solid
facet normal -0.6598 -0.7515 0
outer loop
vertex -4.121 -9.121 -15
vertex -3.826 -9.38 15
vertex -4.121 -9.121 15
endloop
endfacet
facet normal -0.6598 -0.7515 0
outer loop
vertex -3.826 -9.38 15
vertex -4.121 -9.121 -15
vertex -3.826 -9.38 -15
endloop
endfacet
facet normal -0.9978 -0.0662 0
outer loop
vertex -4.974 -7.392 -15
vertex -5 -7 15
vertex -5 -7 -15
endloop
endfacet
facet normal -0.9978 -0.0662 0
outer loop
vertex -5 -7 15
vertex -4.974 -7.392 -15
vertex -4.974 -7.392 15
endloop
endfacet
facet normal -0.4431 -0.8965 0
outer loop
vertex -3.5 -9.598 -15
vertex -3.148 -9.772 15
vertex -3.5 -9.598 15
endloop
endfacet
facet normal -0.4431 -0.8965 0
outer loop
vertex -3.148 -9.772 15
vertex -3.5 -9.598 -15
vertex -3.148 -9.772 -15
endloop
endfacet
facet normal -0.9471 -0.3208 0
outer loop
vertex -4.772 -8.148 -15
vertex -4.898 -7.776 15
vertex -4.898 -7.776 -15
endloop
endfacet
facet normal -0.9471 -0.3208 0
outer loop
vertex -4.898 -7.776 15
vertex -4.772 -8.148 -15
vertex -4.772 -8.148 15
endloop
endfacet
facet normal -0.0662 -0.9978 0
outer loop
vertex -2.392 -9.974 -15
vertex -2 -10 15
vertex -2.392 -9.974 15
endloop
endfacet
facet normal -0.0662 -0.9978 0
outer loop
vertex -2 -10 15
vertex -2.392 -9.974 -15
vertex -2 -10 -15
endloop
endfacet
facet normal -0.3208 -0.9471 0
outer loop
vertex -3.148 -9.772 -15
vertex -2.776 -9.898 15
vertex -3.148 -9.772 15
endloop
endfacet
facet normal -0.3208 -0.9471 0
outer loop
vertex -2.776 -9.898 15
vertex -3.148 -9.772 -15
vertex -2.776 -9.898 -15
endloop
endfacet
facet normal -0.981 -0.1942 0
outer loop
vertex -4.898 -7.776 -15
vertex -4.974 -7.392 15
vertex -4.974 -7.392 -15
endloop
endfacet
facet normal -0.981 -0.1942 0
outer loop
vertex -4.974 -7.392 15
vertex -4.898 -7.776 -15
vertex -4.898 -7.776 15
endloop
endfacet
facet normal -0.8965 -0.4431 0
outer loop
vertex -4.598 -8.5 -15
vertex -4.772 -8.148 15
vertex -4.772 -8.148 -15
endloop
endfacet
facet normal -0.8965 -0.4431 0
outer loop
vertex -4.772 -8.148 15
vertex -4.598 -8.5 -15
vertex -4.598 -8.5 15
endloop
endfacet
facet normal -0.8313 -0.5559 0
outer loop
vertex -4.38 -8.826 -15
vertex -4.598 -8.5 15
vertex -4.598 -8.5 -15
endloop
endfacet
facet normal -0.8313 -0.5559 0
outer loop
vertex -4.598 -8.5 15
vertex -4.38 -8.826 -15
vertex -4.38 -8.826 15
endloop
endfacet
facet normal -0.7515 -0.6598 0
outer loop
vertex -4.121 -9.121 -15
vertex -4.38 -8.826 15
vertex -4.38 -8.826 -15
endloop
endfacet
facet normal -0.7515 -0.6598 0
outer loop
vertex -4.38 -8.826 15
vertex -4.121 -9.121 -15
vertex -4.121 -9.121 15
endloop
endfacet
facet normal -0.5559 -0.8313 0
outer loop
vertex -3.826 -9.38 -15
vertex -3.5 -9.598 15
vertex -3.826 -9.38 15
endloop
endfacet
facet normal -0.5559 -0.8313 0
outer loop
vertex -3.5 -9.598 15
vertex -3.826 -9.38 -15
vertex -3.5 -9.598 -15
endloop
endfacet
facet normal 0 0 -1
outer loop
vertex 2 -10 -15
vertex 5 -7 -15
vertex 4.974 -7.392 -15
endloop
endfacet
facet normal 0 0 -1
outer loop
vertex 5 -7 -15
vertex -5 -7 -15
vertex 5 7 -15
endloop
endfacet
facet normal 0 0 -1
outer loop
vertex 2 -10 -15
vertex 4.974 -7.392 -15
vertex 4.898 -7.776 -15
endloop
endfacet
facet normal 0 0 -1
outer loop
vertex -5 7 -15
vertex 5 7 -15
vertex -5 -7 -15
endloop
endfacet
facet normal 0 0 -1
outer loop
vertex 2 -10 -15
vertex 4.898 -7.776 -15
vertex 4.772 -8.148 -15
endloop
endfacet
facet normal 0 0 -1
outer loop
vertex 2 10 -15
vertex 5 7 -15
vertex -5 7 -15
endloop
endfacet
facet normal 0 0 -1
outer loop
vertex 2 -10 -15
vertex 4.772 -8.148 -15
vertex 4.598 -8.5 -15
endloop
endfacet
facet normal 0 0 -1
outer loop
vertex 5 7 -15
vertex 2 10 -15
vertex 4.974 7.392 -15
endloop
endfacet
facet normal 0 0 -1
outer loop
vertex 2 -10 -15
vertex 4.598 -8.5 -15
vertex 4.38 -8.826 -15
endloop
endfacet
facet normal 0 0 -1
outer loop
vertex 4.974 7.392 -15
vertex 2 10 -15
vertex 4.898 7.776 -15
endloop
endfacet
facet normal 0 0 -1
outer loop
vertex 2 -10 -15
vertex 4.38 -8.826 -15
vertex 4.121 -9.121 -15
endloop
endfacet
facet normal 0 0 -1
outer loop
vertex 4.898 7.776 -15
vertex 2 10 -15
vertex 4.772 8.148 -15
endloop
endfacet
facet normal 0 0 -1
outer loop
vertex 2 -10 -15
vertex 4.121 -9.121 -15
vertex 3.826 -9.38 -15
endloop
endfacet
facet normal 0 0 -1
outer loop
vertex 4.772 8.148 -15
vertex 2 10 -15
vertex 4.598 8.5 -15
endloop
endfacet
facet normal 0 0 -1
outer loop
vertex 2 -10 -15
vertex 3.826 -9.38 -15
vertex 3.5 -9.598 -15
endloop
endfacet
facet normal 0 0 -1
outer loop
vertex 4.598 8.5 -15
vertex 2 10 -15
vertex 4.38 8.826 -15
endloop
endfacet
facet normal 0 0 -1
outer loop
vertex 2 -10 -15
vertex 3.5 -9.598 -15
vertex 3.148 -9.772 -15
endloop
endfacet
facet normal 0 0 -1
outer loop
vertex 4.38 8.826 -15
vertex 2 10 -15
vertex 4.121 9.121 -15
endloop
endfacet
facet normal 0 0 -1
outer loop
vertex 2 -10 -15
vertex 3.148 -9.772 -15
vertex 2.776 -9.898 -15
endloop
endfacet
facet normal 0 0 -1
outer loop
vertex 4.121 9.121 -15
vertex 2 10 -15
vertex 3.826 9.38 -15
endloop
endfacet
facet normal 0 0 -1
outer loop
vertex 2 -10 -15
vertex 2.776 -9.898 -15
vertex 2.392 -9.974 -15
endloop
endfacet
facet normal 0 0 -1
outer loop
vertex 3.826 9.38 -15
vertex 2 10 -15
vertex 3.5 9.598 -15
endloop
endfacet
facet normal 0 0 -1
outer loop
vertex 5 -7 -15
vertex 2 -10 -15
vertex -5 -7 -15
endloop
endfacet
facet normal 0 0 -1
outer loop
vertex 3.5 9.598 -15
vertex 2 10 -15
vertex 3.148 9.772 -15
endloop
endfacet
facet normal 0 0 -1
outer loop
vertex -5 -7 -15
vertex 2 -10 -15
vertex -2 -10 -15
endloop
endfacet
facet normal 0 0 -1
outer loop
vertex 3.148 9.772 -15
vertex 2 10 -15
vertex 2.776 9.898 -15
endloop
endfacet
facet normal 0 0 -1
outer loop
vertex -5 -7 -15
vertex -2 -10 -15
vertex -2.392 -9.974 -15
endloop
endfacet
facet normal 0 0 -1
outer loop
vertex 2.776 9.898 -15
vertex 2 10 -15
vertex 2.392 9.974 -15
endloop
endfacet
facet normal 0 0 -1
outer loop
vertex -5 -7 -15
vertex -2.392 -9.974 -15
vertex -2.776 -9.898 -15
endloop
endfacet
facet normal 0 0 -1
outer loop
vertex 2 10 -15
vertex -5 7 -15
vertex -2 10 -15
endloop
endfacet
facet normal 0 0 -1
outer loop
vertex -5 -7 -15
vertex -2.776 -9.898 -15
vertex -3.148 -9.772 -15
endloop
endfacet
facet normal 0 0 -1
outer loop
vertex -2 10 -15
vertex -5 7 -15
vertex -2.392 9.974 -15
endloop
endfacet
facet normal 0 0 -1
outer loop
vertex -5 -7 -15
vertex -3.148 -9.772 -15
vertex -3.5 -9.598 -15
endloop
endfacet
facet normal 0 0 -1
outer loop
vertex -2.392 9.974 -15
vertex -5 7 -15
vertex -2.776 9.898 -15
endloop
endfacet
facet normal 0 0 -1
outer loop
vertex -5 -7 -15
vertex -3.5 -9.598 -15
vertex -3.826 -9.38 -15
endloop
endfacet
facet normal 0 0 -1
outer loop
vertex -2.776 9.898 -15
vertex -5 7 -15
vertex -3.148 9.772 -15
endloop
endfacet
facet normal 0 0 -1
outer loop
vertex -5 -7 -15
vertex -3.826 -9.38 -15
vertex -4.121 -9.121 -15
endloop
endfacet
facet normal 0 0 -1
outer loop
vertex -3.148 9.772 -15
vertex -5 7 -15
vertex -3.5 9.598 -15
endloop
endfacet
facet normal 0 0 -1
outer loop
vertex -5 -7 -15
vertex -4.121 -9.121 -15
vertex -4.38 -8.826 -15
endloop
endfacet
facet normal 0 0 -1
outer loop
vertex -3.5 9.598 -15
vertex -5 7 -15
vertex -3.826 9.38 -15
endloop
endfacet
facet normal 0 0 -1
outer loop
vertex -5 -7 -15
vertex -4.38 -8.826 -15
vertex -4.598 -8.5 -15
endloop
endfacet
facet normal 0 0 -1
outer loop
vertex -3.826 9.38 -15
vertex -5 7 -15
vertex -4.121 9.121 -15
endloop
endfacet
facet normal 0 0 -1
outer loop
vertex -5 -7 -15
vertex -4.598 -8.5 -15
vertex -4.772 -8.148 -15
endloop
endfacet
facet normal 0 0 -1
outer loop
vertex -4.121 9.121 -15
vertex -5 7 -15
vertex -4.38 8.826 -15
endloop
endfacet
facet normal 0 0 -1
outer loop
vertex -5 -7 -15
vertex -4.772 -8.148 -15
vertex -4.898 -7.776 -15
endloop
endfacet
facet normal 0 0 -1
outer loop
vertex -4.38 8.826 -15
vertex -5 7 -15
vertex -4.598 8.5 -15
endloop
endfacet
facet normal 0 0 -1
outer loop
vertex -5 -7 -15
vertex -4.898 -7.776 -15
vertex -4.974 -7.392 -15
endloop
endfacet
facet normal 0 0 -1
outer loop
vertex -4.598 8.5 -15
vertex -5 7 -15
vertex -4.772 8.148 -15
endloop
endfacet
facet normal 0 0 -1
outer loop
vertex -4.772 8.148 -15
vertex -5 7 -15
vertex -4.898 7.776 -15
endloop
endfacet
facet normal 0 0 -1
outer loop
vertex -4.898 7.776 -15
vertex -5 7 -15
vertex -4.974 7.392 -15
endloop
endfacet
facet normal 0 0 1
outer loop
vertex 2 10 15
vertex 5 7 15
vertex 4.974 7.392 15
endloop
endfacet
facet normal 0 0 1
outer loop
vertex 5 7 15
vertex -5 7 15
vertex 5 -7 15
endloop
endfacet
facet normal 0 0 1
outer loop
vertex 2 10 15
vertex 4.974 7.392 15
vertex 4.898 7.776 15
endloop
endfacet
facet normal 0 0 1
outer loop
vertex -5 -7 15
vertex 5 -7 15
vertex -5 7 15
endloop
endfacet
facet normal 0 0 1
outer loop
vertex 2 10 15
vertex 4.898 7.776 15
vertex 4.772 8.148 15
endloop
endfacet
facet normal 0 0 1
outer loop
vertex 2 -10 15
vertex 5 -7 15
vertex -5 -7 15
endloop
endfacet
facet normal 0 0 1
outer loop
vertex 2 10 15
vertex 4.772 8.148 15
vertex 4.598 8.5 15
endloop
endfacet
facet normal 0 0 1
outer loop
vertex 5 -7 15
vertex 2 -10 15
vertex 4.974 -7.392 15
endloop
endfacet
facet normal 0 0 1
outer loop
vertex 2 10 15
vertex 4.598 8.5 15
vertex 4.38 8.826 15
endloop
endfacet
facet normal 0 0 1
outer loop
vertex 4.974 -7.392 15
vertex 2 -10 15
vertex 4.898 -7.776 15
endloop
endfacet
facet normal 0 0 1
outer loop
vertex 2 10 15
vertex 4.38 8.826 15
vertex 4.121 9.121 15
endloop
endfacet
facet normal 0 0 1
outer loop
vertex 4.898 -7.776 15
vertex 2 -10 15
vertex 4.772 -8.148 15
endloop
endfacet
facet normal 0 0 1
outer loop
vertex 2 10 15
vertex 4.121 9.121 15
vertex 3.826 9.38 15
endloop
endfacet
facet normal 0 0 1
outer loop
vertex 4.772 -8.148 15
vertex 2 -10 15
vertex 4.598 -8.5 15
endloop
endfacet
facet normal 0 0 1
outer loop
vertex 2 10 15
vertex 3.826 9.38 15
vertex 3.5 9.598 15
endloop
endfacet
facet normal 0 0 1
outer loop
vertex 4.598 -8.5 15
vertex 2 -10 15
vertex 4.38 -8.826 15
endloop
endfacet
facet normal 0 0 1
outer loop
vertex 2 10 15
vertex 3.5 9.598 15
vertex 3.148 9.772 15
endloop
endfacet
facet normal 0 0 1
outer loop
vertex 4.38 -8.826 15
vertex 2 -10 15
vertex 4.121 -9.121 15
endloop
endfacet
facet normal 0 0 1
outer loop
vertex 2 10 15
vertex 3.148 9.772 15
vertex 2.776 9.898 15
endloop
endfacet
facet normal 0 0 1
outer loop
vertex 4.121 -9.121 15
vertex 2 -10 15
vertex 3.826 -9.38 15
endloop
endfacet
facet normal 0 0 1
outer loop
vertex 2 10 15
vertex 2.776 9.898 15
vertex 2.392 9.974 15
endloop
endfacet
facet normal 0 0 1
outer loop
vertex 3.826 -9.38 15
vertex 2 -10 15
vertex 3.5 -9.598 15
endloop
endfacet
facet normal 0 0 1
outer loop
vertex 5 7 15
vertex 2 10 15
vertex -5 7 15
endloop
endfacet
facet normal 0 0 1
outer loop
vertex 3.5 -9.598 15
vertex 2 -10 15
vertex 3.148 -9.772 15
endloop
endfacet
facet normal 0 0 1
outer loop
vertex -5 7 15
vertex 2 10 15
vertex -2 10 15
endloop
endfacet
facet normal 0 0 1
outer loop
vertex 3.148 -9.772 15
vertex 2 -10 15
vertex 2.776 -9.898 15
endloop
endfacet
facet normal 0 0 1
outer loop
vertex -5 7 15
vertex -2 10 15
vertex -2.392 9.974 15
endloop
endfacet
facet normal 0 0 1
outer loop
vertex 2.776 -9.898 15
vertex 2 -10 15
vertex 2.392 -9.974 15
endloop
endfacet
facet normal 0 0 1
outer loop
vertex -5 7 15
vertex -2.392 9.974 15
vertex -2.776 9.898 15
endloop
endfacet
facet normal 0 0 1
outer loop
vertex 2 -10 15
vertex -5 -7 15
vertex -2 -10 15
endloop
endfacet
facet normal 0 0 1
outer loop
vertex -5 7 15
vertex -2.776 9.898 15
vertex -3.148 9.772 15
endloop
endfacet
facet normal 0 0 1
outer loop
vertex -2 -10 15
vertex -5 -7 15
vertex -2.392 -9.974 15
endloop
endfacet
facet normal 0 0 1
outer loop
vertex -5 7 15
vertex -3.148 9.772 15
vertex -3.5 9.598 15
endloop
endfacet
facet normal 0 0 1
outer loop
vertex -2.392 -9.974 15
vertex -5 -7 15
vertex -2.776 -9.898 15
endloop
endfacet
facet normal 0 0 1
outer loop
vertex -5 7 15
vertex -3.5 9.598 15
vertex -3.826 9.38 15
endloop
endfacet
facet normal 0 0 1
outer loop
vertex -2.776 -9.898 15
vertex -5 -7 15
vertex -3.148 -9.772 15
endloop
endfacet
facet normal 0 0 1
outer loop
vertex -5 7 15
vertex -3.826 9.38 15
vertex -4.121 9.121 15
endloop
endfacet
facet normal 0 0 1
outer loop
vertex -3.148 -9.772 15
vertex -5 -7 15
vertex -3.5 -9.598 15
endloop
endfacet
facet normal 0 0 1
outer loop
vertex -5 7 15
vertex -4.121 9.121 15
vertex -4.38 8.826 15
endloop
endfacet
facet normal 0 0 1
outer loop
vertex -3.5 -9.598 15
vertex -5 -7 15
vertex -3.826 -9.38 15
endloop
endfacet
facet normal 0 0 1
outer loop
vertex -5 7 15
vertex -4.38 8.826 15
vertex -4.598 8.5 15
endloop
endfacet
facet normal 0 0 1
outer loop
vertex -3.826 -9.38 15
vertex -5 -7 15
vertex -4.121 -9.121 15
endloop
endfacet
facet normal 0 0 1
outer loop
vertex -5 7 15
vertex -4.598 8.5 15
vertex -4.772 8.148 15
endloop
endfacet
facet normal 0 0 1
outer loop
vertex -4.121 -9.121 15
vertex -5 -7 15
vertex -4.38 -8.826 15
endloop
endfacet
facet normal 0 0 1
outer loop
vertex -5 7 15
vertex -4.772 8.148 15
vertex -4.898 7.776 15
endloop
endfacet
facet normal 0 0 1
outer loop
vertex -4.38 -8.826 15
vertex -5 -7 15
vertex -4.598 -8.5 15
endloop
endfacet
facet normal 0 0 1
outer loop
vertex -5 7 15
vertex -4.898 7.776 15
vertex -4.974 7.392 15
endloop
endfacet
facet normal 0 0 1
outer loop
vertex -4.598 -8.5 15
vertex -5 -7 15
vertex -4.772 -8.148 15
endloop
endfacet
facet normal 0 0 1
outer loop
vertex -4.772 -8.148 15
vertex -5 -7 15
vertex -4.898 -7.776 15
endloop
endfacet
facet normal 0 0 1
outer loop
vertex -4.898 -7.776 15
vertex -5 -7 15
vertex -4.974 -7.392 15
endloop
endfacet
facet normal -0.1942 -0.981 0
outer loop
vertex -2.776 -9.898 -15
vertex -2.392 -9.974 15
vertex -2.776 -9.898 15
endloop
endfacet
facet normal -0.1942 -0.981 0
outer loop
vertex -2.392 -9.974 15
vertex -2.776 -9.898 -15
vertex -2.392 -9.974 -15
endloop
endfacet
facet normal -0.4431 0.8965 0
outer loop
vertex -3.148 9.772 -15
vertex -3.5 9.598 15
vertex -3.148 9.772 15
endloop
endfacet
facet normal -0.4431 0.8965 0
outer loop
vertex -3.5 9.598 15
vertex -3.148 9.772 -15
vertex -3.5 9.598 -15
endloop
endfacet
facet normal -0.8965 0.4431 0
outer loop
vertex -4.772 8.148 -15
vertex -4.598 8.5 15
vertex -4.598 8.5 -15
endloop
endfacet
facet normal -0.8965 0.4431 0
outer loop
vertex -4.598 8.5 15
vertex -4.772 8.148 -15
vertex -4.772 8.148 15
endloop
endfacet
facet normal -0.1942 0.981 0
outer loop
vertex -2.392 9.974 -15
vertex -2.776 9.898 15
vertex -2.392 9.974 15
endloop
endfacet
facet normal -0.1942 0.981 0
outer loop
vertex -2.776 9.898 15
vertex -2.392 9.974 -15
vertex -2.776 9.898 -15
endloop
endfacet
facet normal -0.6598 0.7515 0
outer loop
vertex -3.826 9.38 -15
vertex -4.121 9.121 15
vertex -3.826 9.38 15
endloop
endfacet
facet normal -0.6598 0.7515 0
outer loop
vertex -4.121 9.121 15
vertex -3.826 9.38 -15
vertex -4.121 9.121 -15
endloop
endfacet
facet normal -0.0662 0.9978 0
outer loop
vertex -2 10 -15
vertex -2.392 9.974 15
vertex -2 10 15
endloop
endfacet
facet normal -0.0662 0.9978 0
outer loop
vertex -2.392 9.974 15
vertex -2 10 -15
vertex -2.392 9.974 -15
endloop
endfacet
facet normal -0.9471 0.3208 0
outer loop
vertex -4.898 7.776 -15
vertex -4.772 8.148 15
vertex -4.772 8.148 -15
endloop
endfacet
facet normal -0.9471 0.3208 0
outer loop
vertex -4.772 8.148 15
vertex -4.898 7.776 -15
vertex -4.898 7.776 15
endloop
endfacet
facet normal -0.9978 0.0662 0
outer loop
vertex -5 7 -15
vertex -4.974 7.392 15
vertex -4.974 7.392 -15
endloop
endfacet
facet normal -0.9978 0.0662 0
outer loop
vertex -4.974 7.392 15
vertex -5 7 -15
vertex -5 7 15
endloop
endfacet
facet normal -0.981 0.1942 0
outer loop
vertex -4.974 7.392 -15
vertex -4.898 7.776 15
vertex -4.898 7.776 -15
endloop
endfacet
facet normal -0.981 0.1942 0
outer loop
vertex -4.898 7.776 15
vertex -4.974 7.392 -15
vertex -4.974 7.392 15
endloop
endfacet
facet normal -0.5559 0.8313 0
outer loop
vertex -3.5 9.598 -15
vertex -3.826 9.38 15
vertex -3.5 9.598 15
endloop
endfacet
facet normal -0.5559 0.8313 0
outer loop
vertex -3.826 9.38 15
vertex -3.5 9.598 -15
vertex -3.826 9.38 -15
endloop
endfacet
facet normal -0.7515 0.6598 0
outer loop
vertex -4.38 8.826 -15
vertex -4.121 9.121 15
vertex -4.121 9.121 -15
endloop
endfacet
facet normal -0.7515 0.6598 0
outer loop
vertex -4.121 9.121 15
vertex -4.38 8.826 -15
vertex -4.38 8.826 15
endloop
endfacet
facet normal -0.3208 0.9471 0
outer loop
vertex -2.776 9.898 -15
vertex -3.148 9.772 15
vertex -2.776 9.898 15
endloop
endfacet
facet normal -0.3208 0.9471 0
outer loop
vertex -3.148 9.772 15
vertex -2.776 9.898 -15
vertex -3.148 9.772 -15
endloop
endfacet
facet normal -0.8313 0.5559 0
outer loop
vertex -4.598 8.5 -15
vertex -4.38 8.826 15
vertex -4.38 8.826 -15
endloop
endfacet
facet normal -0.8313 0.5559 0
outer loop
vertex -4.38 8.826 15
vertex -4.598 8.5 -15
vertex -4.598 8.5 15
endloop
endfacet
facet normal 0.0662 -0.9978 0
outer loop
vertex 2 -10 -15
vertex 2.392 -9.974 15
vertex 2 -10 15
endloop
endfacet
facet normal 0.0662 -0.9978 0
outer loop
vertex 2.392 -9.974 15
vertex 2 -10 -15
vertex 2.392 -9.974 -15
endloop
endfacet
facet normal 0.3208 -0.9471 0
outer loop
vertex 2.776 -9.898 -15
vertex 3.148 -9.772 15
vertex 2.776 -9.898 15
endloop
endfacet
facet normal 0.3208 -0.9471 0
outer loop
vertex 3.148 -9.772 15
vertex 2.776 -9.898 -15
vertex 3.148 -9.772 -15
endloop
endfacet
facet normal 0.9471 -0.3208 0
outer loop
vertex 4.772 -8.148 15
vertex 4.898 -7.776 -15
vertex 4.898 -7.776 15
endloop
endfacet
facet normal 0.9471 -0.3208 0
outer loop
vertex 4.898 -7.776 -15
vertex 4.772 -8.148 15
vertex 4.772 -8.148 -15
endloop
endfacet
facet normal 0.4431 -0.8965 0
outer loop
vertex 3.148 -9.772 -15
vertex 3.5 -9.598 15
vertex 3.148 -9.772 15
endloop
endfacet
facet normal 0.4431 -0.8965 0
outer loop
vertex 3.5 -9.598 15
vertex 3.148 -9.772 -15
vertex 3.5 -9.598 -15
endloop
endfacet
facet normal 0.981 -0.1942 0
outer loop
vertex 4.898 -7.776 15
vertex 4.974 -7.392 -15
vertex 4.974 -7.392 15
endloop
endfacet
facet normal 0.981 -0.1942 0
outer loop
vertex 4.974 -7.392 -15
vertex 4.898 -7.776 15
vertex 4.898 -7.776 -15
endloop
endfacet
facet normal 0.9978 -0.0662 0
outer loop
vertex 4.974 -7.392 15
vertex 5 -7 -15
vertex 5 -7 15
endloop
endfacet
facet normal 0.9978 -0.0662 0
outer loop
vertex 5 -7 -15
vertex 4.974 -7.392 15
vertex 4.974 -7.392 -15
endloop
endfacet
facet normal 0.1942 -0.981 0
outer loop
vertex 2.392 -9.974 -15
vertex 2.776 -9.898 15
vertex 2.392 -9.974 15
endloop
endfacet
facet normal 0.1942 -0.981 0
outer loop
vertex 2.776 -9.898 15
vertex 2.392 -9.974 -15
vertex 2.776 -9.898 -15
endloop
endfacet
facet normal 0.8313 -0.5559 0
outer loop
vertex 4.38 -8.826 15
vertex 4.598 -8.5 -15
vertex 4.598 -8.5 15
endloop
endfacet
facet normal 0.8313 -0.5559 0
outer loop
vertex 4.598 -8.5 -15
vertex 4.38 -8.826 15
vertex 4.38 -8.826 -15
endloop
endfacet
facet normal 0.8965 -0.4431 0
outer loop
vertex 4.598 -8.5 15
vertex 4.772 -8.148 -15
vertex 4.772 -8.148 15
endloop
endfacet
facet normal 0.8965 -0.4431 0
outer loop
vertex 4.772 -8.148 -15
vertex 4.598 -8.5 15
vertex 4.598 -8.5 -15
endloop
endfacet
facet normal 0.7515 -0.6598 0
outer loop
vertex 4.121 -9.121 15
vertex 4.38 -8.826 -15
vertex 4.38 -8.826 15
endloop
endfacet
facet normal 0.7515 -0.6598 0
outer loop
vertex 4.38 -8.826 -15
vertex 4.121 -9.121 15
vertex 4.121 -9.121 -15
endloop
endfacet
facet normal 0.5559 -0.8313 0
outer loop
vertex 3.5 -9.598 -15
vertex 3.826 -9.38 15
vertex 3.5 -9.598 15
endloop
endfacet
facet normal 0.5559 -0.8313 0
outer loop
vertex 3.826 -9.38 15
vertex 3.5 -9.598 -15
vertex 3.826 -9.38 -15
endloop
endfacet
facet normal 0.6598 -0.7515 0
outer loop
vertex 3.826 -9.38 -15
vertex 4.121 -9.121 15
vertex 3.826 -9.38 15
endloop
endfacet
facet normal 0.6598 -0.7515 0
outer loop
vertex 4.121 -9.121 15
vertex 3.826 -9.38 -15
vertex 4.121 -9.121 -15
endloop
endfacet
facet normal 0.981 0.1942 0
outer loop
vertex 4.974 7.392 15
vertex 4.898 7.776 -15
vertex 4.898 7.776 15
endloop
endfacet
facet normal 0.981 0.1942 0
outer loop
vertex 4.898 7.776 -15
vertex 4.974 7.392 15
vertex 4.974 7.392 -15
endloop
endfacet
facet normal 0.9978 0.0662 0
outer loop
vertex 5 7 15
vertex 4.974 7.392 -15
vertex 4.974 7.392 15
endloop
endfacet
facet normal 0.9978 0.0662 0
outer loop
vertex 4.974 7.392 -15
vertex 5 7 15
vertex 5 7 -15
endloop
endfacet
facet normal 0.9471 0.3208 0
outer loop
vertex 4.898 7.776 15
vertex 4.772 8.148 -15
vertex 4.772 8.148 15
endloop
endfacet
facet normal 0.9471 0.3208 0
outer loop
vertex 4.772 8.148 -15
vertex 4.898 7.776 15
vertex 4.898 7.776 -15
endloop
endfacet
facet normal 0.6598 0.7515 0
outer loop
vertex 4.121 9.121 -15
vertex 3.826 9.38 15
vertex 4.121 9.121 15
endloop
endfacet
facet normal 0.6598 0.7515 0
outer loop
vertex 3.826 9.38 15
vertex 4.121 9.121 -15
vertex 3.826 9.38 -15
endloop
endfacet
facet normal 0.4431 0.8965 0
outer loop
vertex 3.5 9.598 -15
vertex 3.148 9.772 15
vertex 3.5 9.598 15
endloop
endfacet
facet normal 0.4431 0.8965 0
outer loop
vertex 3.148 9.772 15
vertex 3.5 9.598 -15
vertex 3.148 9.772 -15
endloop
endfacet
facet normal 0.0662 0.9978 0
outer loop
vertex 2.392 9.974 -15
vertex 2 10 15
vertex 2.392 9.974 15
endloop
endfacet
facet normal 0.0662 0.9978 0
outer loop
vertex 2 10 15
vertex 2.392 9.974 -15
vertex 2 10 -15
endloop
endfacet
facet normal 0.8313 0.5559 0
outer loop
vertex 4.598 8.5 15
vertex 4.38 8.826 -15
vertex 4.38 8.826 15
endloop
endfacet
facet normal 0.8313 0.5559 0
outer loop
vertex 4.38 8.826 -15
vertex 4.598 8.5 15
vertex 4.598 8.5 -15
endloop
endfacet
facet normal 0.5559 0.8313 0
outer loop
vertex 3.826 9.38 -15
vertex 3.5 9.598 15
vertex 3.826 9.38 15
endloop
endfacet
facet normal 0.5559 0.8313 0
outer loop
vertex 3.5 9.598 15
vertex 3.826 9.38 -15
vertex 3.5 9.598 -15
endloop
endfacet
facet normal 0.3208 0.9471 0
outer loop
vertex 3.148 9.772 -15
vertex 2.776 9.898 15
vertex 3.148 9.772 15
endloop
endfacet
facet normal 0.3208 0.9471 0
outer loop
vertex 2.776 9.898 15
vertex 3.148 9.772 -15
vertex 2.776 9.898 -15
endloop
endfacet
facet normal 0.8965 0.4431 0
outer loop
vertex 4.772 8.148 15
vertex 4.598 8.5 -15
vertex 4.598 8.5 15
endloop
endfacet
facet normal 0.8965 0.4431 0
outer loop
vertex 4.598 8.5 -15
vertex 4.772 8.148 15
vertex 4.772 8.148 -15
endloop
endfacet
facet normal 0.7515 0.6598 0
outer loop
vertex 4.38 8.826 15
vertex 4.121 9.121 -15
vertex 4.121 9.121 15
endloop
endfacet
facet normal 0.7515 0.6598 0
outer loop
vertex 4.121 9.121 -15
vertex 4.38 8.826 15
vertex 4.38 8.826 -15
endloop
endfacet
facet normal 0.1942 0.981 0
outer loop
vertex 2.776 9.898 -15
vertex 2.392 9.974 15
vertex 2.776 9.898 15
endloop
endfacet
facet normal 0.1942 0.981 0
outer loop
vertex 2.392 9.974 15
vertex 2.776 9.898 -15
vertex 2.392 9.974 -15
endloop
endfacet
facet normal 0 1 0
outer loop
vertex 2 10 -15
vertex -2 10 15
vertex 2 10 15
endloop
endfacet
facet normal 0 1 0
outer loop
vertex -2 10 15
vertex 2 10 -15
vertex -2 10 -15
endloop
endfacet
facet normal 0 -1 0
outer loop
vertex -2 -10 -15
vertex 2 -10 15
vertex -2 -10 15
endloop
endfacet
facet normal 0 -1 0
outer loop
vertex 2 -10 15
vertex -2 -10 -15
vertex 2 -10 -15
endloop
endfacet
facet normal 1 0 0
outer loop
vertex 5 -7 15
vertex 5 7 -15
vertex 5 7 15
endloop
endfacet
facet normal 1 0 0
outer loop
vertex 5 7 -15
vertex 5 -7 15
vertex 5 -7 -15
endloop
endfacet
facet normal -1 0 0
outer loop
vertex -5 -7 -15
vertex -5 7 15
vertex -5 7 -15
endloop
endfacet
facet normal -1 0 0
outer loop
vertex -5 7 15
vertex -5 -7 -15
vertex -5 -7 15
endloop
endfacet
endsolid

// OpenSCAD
use <MCAD/boxes.scad>
$fa=1;
$fs=0.4;
roundedBox(size=[10,20,30],radius=3,sidesonly=true);
